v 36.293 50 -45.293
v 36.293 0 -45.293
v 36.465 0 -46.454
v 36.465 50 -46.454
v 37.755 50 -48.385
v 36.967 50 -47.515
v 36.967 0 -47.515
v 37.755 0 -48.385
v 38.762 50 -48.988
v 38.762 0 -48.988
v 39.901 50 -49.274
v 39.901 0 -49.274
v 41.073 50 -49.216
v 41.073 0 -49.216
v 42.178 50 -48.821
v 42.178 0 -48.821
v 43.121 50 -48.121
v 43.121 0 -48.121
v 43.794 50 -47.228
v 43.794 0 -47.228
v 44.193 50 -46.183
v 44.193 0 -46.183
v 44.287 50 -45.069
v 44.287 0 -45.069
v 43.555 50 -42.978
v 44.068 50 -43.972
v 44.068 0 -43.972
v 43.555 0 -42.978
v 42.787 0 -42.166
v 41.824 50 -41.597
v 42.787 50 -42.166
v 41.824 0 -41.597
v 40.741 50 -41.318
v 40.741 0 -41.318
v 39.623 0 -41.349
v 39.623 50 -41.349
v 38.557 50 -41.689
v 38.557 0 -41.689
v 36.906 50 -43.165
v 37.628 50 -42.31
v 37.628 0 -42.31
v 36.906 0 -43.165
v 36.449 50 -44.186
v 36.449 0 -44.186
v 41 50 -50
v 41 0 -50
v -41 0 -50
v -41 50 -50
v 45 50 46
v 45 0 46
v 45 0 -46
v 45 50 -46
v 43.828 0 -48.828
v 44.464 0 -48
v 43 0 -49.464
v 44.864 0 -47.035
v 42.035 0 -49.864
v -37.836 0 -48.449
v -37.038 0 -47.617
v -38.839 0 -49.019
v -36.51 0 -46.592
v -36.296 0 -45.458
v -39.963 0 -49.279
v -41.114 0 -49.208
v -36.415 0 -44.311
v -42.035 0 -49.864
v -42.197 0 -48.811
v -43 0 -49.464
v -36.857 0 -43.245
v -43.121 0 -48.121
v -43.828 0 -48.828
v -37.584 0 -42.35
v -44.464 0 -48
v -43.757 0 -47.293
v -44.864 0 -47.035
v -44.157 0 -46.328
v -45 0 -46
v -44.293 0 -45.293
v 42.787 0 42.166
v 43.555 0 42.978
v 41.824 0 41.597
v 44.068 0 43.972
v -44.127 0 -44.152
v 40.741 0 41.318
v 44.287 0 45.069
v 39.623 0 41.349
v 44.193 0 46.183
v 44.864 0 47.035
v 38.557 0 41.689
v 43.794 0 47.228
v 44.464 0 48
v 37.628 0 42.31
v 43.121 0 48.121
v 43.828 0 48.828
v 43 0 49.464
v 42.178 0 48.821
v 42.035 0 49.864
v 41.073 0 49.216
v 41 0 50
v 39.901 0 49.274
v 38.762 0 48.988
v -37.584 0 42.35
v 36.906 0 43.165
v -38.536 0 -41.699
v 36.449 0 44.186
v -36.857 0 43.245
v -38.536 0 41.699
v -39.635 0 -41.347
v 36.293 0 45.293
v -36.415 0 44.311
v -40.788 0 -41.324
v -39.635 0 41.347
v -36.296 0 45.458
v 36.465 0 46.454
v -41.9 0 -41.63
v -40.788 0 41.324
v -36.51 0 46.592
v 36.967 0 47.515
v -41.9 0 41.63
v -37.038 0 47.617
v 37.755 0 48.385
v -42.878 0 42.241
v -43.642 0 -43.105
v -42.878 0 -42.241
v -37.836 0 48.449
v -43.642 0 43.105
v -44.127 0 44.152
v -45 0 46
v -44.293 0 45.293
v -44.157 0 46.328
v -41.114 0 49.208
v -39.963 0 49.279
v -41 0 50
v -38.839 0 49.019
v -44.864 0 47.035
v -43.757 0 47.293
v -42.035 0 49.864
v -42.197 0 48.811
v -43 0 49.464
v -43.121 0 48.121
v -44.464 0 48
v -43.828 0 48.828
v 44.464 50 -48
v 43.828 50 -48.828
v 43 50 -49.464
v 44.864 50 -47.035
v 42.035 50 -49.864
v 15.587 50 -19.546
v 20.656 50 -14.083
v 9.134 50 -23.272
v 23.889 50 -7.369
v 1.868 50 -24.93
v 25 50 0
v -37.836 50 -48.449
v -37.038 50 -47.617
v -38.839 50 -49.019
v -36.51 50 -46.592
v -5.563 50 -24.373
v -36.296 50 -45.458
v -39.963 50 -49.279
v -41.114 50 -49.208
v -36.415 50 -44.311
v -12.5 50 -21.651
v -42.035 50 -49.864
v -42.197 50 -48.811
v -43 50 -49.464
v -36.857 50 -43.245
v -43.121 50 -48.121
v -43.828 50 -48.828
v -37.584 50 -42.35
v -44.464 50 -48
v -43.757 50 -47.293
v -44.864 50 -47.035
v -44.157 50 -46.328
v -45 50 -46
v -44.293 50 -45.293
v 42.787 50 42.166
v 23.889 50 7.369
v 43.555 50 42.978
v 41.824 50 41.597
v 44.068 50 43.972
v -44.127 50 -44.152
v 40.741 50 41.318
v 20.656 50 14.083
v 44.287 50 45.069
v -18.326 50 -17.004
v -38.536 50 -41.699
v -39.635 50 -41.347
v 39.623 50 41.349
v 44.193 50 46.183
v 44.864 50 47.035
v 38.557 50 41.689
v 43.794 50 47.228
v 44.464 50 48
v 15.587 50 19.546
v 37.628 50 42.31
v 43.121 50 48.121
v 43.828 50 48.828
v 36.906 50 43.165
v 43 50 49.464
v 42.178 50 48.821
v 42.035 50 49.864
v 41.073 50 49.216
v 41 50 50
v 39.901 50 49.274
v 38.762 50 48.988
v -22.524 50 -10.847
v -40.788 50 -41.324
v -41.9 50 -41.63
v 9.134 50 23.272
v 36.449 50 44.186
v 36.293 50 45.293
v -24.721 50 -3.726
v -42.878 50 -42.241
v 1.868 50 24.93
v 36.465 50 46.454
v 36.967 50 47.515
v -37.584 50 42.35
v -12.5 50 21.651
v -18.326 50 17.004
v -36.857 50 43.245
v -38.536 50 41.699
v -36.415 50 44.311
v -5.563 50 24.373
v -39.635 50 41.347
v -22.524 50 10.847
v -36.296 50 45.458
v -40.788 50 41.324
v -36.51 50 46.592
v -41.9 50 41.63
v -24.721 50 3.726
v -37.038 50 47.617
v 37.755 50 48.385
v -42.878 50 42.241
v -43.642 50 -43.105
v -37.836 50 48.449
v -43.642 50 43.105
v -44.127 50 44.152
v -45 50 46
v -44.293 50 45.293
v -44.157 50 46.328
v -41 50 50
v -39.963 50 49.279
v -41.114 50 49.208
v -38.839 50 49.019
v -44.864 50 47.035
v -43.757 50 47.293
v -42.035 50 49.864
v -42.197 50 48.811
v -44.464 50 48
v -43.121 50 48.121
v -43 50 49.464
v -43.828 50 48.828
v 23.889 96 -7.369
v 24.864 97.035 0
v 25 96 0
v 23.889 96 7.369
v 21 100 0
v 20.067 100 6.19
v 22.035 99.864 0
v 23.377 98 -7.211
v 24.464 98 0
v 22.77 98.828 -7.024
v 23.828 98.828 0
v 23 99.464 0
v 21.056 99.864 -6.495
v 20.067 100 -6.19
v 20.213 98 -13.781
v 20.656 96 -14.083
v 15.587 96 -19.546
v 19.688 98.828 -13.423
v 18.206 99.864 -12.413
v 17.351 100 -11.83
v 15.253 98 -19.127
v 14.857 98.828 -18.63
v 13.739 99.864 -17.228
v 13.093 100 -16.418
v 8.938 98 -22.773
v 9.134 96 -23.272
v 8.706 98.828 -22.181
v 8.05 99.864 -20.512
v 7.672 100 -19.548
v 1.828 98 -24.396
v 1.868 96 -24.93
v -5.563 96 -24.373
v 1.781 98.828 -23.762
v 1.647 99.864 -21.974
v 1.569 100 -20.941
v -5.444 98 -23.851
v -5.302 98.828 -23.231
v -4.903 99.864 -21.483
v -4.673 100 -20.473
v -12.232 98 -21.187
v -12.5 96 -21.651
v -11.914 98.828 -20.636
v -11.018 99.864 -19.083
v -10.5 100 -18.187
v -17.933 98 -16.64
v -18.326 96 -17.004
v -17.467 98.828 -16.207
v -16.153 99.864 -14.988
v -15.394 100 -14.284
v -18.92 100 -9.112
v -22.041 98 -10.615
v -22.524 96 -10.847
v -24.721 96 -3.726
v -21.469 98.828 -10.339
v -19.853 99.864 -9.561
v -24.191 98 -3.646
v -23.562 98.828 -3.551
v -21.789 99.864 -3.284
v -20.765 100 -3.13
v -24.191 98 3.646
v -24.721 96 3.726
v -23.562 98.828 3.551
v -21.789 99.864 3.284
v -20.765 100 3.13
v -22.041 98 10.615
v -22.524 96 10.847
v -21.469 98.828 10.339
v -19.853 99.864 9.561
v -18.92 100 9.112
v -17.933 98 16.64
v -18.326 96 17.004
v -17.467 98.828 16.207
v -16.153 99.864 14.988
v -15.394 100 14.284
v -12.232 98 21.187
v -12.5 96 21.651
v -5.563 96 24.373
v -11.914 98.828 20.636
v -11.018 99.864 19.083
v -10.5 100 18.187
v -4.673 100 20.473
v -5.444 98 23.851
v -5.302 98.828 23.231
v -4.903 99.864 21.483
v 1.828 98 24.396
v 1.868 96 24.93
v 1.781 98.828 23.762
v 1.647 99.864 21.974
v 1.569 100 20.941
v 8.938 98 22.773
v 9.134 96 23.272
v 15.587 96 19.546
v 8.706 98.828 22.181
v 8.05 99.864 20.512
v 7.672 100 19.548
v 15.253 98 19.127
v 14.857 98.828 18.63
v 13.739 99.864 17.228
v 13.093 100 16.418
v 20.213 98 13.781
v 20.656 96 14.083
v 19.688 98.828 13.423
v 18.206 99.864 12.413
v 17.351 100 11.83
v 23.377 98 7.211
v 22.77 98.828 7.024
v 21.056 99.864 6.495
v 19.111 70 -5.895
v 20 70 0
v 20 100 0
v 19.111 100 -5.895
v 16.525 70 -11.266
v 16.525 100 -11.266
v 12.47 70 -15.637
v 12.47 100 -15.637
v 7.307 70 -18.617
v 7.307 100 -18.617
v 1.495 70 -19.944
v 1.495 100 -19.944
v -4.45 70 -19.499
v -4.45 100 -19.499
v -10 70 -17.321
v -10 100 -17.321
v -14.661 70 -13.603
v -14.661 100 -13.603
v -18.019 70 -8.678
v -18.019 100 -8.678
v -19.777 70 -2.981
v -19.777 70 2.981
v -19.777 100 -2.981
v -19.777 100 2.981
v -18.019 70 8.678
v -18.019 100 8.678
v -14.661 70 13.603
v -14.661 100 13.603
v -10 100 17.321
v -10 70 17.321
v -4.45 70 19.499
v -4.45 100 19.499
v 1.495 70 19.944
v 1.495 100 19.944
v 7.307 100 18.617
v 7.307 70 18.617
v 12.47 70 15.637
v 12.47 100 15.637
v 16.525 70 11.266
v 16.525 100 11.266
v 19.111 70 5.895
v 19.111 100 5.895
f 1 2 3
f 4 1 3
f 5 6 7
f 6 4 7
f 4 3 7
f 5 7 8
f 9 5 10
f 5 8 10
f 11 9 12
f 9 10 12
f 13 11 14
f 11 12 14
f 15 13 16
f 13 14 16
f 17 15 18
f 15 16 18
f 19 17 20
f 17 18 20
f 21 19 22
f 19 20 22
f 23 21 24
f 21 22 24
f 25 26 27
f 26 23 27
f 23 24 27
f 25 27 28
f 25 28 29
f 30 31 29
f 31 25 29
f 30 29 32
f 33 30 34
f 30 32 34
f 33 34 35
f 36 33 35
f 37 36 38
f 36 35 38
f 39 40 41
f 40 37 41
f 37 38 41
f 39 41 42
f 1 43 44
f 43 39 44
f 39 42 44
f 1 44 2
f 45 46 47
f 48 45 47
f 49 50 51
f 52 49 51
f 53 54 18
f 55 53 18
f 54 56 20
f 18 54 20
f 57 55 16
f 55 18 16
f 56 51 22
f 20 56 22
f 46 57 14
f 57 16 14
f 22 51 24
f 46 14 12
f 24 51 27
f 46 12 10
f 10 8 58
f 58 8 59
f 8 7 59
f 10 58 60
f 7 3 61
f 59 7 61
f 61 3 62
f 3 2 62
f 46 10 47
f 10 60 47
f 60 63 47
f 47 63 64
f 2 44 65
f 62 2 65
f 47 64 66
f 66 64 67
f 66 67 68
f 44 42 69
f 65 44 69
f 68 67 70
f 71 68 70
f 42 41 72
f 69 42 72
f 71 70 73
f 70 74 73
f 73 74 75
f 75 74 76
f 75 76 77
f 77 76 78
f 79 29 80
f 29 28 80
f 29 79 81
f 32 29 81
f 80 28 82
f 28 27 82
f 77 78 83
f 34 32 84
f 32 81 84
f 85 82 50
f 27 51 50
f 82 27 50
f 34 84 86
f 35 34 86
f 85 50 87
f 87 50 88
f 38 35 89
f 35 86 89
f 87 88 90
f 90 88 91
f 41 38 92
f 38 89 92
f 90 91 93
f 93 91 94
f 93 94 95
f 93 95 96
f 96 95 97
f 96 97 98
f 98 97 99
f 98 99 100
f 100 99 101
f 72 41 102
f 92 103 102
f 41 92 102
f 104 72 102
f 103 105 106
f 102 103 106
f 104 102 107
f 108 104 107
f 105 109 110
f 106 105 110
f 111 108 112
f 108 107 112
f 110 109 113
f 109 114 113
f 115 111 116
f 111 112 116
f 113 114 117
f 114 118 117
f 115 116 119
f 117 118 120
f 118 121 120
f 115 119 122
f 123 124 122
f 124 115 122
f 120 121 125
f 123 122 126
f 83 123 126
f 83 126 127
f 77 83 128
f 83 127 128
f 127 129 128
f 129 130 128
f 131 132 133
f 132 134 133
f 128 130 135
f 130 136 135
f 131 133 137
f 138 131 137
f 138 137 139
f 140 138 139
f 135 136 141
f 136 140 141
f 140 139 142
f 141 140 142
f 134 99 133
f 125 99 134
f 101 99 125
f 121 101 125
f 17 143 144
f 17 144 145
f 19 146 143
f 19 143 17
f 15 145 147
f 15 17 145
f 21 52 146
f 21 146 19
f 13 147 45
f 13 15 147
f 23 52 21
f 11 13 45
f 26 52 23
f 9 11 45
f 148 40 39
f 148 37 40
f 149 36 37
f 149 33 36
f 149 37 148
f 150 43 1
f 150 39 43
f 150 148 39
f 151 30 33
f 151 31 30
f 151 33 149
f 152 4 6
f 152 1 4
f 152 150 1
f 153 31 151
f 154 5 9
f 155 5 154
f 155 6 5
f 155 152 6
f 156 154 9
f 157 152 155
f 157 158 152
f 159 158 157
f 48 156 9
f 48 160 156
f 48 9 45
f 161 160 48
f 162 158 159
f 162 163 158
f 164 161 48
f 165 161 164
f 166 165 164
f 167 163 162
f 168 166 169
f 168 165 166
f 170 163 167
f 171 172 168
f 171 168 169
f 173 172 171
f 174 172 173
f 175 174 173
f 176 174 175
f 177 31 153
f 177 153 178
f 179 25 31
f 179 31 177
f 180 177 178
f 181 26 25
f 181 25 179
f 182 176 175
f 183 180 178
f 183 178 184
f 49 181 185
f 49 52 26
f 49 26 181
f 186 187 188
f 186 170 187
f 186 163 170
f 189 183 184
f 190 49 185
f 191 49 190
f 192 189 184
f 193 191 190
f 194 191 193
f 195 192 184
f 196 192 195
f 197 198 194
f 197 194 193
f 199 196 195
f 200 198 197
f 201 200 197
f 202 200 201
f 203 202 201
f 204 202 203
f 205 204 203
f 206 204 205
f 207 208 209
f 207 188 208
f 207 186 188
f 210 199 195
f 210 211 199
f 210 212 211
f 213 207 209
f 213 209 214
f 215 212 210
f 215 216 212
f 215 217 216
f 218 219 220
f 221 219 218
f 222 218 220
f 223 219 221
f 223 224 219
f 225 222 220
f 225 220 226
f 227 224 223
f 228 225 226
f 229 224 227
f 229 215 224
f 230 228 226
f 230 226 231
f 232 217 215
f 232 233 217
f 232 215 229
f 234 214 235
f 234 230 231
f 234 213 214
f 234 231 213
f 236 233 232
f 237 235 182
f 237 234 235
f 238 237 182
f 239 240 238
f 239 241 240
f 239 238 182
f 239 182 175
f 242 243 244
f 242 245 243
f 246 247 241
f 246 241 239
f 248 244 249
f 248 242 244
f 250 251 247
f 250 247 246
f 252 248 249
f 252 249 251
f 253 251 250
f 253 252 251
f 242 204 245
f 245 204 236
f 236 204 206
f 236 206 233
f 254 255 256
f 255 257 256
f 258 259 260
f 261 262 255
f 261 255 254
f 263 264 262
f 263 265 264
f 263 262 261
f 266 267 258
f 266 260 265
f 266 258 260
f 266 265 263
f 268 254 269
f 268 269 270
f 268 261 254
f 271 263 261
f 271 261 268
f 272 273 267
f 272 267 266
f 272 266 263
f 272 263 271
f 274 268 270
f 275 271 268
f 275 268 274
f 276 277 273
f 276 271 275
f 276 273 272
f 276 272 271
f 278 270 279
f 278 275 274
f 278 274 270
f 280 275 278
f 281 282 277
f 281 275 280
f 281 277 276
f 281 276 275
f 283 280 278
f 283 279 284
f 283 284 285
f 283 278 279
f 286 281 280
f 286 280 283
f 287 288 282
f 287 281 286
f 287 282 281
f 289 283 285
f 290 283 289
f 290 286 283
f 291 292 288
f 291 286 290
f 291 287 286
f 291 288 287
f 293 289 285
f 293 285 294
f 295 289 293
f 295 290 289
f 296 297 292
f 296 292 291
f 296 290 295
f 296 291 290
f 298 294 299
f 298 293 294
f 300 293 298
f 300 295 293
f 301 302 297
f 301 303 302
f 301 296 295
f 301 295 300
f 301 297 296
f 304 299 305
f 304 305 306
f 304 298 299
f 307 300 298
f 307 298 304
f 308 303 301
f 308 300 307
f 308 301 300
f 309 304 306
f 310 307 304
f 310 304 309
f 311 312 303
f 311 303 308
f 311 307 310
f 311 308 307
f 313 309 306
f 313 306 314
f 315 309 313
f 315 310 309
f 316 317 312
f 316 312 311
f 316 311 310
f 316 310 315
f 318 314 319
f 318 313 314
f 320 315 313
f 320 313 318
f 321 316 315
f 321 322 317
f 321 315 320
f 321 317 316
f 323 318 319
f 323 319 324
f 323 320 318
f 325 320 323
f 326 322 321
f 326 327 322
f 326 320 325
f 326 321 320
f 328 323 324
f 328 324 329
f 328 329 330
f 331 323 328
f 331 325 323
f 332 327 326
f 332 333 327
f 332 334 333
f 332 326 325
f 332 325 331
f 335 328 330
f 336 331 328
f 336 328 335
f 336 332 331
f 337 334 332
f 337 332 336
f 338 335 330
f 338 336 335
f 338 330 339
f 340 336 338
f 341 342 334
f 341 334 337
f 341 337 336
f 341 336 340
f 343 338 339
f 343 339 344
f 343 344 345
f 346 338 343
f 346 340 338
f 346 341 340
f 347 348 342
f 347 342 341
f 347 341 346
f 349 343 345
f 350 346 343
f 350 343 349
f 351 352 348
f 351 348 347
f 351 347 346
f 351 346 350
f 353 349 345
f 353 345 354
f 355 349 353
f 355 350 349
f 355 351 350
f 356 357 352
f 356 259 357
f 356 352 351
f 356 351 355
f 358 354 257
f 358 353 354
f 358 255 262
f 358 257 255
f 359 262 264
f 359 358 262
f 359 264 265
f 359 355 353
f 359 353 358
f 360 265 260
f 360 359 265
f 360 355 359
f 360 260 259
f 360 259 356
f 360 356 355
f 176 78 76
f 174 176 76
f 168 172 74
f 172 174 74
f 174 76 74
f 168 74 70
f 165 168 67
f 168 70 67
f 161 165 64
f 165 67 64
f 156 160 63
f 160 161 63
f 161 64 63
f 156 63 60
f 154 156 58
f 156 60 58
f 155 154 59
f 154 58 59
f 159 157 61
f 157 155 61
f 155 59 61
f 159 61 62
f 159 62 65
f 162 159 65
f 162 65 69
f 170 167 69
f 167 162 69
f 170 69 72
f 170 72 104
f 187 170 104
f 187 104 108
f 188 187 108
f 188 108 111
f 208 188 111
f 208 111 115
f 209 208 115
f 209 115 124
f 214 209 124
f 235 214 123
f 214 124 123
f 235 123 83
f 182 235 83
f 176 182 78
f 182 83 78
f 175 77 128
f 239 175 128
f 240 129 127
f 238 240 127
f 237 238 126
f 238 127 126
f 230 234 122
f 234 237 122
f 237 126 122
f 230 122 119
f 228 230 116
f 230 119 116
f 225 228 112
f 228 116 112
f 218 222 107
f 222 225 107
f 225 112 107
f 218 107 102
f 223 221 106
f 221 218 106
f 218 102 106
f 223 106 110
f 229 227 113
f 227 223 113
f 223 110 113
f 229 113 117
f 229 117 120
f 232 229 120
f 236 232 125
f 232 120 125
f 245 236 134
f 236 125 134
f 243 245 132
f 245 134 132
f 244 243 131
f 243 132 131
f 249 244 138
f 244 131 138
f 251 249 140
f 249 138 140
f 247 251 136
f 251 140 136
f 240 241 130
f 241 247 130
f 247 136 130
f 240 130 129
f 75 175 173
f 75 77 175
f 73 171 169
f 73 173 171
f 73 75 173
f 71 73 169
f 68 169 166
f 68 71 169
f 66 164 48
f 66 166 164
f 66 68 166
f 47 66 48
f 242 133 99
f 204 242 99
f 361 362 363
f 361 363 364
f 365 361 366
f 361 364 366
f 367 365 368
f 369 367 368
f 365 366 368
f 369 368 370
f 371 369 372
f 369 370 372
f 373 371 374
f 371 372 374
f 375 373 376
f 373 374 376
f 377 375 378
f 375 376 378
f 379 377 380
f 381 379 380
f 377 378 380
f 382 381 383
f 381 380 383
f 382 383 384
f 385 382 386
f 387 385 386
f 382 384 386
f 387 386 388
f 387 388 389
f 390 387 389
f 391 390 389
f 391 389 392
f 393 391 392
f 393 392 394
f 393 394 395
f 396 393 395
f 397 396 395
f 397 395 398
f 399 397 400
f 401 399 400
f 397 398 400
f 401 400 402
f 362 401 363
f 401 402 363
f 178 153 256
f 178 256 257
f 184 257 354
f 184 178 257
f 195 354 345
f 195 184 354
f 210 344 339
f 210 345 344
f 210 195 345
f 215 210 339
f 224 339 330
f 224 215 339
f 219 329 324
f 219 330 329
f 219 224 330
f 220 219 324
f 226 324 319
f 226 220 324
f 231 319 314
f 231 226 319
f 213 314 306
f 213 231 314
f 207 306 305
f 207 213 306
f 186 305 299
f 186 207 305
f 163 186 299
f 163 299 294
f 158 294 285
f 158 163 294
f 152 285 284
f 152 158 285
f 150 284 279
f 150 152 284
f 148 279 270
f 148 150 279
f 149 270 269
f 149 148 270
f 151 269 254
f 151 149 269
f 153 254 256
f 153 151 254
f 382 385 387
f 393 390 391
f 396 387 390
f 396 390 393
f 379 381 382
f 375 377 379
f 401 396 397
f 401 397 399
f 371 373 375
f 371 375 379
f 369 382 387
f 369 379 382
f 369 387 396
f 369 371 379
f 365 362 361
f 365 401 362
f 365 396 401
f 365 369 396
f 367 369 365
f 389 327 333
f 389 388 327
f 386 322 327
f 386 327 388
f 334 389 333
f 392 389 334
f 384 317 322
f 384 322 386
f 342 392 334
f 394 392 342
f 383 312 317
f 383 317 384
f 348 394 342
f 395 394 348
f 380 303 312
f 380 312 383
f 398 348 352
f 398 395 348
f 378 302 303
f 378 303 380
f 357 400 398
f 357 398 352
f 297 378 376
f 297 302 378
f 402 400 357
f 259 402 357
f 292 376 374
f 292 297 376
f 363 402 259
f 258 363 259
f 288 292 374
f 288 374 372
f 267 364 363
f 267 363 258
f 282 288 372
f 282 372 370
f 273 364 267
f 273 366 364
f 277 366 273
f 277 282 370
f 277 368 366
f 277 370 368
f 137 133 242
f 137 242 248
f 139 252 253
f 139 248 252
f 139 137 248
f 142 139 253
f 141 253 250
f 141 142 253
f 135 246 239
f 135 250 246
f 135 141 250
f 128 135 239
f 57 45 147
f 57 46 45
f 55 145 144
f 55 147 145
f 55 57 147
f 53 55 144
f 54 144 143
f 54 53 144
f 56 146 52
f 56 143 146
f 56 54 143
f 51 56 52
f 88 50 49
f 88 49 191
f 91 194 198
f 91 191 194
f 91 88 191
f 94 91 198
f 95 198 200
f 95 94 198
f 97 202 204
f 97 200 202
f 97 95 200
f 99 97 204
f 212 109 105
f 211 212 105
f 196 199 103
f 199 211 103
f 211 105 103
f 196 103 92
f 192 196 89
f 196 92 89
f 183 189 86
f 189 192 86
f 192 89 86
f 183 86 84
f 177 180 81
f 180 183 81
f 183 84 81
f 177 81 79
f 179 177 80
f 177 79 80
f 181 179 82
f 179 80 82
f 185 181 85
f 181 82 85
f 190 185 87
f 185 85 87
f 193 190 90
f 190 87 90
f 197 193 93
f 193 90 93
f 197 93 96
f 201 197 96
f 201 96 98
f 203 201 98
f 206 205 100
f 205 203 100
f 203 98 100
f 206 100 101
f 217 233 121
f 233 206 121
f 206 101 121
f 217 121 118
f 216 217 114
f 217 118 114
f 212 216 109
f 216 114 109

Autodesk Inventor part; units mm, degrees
ref_plane "YZ Plane" through (0, 0, 0) normal (1, 0, 0) x (0, 1, 0)
ref_plane "XZ Plane" through (0, 0, 0) normal (0, 1, 0) x (-1, 0, 0)
ref_plane "XY Plane" through (0, 0, 0) normal (0, 0, 1) x (1, 0, 0)
sketch "Boceto1" plane through (0, 0, 0) normal (0, 1, 0) x (-1, 0, 0)
  line L0 (41, 50) -> (-41, 50)
  line L1 (-45, 46) -> (-45, -46)
  line L2 (-41, -50) -> (41, -50)
  line L3 (45, -46) -> (45, 46)
  line L4 (45, 50) -> (-45, -50) construction
  line L5 (-45, 50) -> (45, -50) construction
  arc A0 (45, 46) -> (41, 50) centre (41, 46) ccw
  arc A1 (41, -50) -> (45, -46) centre (41, -46) ccw
  arc A2 (-41, 50) -> (-45, 46) centre (-41, 46) ccw
  arc A3 (-45, -46) -> (-41, -50) centre (-41, -46) ccw
  line L6 (43.8284, -48.8284) -> (40.2929, -45.2929)
  line L7 (-43.8284, -48.8284) -> (-40.2929, -45.2929)
  line L8 (-43.8284, 48.8284) -> (-40.2929, 45.2929)
  circle A4 centre (-40.2929, 45.2929) radius 4
  line L9 (43.8284, 48.8284) -> (40.2929, 45.2929)
  circle A5 centre (40.2929, 45.2929) radius 4
  circle A6 centre (40.2929, -45.2929) radius 4
  circle A7 centre (-40.2929, -45.2929) radius 4
  point P0 (0, 0)
  dimension "d1" = 90
  dimension "d2" = 100
  dimension "d3" = 4
  dimension "d5" = 5
  dimension "d6" = 5
  dimension "d7" = 5
  dimension "d9" = 8
  dimension "d10" = 5
  dimension "d11" = 8
  dimension "d12" = 8
  dimension "d13" = 8
extrude "Extrusión1" add sketch "Boceto1" along normal blind 50
sketch "Boceto2" plane through (0, 50, 0) normal (0, 1, 0) x (1, 0, 0)
  circle A0 centre (0, 0) radius 25
  dimension "d16" = 50
extrude "Extrusión2" add sketch "Boceto2" along normal blind 50
sketch "Boceto3" plane through (0, 100, 0) normal (0, 1, 0) x (1, 0, 0)
  circle A0 centre (0, 0) radius 20
  dimension "d19" = 40
extrude "Extrusión3" cut sketch "Boceto3" against normal blind 30
thread "Rosca1" size "M50x4" class "6H" standard "ANSI Metric M Profile" full length
fillet "Empalme1" radius 4 1 edges at (-25, 100, 0)
properties part number "Tarea 01 Ayala Dinamica"
